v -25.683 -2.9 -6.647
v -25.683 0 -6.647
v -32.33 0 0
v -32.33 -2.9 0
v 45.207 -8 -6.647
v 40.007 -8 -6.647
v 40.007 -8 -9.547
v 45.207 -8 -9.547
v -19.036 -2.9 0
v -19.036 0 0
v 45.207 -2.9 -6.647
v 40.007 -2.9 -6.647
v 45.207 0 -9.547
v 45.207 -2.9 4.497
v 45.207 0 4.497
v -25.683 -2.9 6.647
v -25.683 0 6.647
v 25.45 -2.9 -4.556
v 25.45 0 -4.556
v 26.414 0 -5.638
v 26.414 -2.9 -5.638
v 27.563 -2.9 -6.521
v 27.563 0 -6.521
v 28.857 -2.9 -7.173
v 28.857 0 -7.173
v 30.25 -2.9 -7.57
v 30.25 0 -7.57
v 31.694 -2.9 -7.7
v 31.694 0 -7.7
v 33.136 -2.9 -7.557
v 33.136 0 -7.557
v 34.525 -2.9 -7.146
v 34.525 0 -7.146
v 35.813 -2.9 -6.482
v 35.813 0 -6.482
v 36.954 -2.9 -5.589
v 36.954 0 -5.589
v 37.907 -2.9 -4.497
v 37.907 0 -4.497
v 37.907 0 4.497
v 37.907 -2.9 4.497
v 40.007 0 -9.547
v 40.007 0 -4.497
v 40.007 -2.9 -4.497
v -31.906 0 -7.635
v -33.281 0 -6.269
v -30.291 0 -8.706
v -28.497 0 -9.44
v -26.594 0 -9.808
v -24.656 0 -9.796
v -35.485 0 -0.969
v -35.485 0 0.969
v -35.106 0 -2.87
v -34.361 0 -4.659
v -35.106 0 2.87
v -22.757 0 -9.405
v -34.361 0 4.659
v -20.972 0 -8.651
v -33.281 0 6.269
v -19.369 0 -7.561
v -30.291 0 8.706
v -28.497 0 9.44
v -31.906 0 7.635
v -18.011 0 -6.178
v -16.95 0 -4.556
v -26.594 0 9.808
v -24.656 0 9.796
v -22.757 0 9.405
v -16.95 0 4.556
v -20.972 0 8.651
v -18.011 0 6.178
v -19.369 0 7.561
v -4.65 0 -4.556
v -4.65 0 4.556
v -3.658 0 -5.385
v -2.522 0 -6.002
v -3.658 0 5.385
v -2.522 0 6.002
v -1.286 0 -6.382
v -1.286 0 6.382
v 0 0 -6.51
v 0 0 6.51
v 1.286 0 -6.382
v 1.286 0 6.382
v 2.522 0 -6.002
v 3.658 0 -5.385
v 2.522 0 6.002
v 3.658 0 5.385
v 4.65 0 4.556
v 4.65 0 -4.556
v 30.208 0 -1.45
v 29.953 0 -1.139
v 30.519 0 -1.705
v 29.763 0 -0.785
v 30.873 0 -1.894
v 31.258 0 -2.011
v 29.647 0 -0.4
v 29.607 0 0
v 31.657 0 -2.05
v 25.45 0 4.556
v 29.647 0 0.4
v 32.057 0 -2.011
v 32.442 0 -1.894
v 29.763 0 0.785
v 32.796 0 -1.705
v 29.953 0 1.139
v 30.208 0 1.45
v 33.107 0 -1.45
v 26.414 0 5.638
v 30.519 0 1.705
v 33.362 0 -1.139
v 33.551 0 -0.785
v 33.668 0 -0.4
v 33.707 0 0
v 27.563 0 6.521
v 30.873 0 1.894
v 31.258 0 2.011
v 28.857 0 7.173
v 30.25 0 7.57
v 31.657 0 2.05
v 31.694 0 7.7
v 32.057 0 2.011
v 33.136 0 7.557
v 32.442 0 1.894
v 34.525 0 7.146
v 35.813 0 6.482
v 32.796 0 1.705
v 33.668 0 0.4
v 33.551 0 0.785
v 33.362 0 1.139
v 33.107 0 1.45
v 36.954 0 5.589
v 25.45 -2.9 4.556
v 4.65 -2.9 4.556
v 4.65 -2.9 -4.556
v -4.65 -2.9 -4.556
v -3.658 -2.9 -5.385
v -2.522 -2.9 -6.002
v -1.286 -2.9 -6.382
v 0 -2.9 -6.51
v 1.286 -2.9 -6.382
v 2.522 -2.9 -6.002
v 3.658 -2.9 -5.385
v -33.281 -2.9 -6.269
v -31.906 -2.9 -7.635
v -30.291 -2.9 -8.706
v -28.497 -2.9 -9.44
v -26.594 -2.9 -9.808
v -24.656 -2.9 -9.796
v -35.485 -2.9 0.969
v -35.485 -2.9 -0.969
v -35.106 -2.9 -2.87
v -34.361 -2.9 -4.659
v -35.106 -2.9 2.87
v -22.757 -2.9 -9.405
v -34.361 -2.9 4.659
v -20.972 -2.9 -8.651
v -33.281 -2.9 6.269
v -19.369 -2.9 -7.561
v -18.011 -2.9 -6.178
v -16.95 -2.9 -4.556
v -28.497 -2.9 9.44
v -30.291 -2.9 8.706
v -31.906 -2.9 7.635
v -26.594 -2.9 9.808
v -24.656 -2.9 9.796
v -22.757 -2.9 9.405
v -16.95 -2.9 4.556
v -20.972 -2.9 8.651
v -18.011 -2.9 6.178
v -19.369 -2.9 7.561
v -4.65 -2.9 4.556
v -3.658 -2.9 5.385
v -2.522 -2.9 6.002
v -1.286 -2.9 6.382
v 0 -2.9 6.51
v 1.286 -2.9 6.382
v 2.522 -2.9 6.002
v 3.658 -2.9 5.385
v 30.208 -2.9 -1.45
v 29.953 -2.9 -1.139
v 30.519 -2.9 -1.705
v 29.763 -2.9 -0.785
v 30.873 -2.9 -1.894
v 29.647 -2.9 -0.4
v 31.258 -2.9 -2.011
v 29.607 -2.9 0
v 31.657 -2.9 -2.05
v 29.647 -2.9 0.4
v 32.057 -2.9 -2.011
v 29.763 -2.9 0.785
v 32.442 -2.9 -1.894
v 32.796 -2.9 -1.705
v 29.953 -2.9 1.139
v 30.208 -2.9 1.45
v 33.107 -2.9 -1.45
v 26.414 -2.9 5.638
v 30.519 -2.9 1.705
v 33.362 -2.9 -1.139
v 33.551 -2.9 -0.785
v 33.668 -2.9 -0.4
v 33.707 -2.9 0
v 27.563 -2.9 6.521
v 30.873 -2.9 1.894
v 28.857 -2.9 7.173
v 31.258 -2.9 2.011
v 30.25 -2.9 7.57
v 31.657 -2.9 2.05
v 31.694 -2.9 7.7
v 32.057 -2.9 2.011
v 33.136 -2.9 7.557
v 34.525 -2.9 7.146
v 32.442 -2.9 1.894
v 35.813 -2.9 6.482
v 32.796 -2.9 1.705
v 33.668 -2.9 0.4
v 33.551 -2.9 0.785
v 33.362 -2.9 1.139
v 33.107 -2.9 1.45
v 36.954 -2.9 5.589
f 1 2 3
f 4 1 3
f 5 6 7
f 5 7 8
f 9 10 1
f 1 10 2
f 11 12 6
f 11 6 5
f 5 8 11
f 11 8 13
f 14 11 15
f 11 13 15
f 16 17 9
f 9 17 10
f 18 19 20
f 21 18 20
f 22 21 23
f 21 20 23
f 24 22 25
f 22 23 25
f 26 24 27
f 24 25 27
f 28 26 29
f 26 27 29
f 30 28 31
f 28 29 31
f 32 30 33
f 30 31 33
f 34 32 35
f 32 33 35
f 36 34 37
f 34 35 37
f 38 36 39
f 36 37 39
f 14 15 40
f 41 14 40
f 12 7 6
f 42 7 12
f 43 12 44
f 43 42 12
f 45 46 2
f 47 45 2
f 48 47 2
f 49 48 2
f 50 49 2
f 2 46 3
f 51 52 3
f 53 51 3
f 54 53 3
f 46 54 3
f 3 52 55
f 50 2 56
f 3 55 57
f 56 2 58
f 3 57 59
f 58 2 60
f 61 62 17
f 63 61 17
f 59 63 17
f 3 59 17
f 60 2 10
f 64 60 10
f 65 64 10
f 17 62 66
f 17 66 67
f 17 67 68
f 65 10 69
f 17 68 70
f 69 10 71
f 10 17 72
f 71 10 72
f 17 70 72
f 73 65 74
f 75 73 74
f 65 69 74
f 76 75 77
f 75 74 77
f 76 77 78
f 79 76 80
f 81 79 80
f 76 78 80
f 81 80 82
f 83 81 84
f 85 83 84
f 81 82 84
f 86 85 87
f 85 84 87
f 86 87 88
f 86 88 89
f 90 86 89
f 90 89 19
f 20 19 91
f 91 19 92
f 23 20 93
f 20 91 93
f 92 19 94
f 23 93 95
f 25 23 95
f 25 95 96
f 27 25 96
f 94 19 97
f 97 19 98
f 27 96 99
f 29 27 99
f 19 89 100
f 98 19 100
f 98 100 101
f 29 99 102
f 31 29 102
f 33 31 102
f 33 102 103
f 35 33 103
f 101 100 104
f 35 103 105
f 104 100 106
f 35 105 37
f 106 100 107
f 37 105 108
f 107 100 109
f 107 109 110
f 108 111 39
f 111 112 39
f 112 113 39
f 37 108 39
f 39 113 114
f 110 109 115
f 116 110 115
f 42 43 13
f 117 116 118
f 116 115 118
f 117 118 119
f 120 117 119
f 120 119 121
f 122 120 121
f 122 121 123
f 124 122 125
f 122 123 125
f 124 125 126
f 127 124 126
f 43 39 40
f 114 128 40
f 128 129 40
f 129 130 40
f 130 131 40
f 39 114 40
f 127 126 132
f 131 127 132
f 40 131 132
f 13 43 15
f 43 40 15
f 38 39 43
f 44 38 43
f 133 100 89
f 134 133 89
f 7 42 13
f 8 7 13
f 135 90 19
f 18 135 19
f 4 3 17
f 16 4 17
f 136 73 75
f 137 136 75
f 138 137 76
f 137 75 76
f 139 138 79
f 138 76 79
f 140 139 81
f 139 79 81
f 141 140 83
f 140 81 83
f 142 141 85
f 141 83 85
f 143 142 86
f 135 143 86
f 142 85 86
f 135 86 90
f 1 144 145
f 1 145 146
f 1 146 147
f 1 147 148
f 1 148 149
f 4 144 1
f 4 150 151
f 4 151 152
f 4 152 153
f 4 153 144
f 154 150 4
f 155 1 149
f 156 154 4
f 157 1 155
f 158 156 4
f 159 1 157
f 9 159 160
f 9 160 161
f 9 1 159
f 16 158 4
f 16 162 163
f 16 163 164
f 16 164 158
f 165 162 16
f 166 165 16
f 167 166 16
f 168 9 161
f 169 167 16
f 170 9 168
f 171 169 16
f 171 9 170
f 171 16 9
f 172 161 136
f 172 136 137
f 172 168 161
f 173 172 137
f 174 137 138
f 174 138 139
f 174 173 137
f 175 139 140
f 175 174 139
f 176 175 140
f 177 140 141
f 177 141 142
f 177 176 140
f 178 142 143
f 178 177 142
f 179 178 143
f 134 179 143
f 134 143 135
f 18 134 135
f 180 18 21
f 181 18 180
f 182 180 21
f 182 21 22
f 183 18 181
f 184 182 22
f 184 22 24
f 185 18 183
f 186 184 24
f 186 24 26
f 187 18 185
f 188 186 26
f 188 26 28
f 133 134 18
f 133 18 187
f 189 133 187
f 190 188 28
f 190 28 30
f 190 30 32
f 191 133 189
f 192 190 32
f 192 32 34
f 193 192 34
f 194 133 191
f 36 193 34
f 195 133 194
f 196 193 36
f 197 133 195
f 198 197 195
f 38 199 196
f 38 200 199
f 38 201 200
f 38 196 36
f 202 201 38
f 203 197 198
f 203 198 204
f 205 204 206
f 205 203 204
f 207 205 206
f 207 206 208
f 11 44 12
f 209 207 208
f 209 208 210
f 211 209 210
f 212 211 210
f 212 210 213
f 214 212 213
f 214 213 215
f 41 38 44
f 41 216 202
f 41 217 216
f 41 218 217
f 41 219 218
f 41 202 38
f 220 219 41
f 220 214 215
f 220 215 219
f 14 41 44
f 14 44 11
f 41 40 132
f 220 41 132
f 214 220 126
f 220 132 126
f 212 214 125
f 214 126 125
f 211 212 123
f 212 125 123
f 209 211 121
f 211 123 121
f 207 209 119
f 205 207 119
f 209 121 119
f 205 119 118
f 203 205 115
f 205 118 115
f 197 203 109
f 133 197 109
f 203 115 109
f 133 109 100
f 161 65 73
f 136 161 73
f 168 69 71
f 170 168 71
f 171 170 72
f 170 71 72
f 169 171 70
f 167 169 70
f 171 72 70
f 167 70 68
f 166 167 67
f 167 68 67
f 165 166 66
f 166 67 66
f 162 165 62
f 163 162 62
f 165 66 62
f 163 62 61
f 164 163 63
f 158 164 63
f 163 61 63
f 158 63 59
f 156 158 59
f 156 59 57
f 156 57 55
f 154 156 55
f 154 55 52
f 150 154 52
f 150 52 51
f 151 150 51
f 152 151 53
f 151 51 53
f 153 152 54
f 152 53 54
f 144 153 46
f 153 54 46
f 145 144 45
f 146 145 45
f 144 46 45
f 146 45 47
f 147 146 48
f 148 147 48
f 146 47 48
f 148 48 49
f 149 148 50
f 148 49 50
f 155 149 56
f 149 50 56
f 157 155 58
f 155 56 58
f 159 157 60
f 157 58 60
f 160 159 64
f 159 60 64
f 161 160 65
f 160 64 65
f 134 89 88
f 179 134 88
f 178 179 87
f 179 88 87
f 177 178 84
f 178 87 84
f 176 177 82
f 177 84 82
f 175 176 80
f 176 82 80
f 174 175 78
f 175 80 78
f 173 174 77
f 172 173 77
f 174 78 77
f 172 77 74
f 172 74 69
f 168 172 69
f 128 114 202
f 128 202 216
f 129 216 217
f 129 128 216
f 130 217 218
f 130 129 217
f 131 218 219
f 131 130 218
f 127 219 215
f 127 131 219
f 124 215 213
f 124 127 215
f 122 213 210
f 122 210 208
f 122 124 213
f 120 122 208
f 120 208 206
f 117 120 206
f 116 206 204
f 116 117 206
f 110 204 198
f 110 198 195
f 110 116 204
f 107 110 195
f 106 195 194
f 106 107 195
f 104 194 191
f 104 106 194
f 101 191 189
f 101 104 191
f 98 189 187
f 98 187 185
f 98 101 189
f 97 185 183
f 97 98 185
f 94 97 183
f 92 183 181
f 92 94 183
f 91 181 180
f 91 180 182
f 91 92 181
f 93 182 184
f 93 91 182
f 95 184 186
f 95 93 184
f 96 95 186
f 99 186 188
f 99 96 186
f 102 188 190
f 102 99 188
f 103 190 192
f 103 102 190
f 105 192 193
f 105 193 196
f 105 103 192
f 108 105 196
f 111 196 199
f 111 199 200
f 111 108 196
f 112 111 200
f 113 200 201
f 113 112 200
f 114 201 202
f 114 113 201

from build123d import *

# Parameters (mm, degrees)
F0_R     = 2.05
F0_W     = 5.2
F0_H     = 2.15
F1_DEPTH = 2.9
F0_H_2   = 2.9
F2_DEPTH = 8


with BuildPart() as f1:
    # F0 (on Front) → F1 (new body)
    with BuildSketch(Plane.XZ):
        with BuildLine():
            Line((25.45, 4.556051), (4.65, 4.556051))
            ThreePointArc((4.65, 4.556051), (0, 6.51), (-4.65, 4.556051))
            Line((-4.65, 4.556051), (-16.95, 4.556051))
            ThreePointArc((-16.95, 4.556051), (-35.532978, 0), (-16.95, -4.556051))
            Line((-16.95, -4.556051), (-4.65, -4.556051))
            ThreePointArc((-4.65, -4.556051), (0, -6.51), (4.65, -4.556051))
            Line((4.65, -4.556051), (25.45, -4.556051))
            ThreePointArc((25.45, -4.556051), (31.693638, -7.699915), (37.907447, -4.497499))
            Line((37.907447, -4.497499), (37.907447, 0))
            Line((37.907447, 0), (37.907447, 4.497499))
            ThreePointArc((37.907447, 4.497499), (31.693638, 7.699915), (25.45, 4.556051))
        make_face()
        Polygon((-32.329781, 0), (-25.682978, 6.646804), (-19.036174, 0), (-25.682978, -6.646804), align=None, mode=Mode.SUBTRACT)
        with Locations((31.657447, 0)):
            Circle(F0_R, mode=Mode.SUBTRACT)
        Polygon((45.207447, 4.497499), (37.907447, 4.497499), (37.907447, 0), (37.907447, -4.497499), (40.007447, -4.497499), (45.207447, -4.497499), align=None)
        with Locations((42.607447, -5.572499)):
            Rectangle(F0_W, F0_H)
    extrude(amount=F1_DEPTH)

    # F0 (on Front) → F2 (join)
    with BuildSketch(Plane.XZ):
        with Locations((42.607447, -8.097499)):
            Rectangle(F0_W, F0_H_2)
    extrude(amount=F2_DEPTH)


solid = f1.part
